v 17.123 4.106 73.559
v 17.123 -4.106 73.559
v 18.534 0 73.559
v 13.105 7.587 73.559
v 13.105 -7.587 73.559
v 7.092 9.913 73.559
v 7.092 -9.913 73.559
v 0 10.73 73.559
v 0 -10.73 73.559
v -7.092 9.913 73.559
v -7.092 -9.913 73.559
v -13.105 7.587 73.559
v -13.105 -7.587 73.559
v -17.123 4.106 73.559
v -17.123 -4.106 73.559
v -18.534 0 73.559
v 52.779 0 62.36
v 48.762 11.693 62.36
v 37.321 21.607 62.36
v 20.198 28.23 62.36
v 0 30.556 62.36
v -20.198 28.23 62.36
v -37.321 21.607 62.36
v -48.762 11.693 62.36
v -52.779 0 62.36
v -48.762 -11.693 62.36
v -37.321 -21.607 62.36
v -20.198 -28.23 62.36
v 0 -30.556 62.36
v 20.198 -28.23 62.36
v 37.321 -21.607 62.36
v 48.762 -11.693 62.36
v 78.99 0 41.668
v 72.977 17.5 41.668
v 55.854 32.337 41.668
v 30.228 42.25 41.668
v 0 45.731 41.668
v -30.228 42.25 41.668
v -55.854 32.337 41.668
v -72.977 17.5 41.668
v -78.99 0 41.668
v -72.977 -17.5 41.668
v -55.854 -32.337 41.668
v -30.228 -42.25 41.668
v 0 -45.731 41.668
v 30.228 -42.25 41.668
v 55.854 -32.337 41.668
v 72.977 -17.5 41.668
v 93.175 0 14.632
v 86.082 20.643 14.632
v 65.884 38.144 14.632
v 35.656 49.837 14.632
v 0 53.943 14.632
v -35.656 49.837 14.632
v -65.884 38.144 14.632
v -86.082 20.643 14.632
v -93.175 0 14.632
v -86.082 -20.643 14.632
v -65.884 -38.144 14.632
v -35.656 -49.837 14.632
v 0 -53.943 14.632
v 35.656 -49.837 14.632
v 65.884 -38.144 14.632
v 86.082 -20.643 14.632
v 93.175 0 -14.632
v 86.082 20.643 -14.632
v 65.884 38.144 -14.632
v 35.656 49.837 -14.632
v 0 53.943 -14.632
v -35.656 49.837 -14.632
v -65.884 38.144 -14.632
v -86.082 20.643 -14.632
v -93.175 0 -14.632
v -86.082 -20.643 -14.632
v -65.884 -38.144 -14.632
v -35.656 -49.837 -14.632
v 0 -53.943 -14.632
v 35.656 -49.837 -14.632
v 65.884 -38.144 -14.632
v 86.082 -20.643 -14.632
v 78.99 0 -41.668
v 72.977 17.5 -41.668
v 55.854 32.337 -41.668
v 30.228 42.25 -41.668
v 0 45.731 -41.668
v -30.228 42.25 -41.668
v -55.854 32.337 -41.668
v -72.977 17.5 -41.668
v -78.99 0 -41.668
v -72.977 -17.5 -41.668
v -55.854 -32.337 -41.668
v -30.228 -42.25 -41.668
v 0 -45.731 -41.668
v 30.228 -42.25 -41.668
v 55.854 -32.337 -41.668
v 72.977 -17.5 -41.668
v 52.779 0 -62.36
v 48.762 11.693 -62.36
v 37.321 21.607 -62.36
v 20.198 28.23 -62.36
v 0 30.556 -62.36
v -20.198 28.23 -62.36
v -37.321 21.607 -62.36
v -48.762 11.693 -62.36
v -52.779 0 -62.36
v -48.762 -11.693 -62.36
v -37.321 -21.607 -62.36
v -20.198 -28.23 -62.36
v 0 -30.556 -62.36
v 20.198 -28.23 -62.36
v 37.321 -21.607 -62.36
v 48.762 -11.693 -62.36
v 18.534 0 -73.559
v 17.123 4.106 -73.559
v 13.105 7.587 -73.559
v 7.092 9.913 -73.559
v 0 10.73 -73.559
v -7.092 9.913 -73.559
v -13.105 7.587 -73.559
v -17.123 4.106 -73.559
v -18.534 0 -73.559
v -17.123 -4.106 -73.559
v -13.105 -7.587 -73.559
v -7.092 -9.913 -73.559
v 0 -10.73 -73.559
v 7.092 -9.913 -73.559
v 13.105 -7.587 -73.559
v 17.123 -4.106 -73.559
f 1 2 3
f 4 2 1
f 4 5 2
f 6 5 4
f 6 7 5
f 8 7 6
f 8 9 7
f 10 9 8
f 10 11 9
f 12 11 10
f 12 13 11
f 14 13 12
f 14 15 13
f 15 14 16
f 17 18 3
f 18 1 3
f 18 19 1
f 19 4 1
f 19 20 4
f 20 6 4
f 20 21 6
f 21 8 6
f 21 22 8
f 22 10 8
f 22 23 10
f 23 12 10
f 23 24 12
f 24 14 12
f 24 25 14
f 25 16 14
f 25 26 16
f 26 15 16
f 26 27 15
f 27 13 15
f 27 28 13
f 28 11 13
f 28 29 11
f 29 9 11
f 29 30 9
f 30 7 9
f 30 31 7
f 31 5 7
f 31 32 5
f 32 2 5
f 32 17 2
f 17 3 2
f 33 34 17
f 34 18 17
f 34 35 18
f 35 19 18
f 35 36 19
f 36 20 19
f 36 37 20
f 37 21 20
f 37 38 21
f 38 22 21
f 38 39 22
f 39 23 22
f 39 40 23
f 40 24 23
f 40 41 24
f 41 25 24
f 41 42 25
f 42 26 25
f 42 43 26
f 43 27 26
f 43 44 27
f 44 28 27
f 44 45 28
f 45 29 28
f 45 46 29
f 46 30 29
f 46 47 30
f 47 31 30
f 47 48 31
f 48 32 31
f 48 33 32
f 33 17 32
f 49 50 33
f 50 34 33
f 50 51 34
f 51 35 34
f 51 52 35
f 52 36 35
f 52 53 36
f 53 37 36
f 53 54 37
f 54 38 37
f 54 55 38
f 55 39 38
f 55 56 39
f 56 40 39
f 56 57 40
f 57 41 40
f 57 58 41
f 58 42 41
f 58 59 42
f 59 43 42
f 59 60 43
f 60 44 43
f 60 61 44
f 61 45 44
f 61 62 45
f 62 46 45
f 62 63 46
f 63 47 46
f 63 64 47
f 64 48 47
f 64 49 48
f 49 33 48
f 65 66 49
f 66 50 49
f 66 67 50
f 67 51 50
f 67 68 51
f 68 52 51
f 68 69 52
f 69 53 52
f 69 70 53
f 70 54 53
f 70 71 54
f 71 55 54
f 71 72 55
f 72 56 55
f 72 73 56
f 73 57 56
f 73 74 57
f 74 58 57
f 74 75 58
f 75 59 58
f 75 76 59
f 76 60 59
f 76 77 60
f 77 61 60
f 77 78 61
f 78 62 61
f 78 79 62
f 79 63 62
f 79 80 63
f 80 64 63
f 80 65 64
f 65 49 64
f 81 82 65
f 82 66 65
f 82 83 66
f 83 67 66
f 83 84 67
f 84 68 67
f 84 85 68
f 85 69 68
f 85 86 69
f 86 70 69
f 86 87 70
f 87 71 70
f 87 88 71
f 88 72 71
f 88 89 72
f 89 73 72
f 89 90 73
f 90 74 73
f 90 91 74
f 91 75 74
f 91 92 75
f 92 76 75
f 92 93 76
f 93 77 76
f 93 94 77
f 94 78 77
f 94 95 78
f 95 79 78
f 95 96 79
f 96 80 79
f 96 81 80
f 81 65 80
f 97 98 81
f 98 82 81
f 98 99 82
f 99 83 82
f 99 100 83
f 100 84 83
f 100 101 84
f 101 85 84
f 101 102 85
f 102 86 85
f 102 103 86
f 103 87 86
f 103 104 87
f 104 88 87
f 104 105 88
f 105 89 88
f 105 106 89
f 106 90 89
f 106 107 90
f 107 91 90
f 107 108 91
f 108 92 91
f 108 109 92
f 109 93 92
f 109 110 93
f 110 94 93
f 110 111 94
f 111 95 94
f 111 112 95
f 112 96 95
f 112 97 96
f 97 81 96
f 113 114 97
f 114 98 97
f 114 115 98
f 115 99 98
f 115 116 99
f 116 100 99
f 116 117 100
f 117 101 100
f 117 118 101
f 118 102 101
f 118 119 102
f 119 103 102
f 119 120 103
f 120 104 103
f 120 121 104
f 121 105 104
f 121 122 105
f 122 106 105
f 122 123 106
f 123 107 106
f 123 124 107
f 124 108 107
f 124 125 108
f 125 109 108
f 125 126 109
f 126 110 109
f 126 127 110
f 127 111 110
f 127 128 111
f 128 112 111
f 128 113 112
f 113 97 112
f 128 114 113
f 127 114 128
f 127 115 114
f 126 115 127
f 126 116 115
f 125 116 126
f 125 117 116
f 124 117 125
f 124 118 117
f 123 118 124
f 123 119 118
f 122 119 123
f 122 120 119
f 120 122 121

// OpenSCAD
// Generated by SolidPython 1.0.1 on 2020-07-29 00:46:54


scale(v = [19, 11, 15]) {
	sphere(r = 5);
}
/***********************************************
*********      SolidPython code:      **********
************************************************
 
# import packages: SolidPython
from solid import *
from solid.utils import *
from itertools import chain, combinations, permutations


class Resize:

    def __init__(self, scad_file):
        self.scad_file = scad_file
        #self.scad_file = import_scad(scad_file)
        # cone/cylinder param:
        self.r1 = 0
        self.r2 = 0
        self.h = 0
        # rectangular prism param:
        self.w = 0
        self.l = 0
        # ellipse param:
        self.r = 0

    # import OpenScad code (file name corresponds to shape)


    # classify shape + parameters
    def assign(self, param1, param2, param3):
        if self.scad_file == 'cone.scad':
            self.r1 = param1
            self.r2 = param2
            self.h = param3
        elif self.scad_file == 'cylinder.scad':
            self.r1 = param1
            self.r2 = param2
            self.h = param3
        elif self.scad_file == 'rectangularPrism.scad':
            self.h = param1
            self.l = param2
            self.w = param3
        else:
            self.r = param1
            self.h = param2

    # resize parameters
    def iterate(self):
        x = range(3, 20, 2)
        i = 1
        if self.scad_file == 'cone.scad':
            tempList = list(permutations(x, 2))
            for temp in tempList:
                param1 = temp[0]
                param2 = temp[1]
                filepath = 'produced_scad_files/' + 'cone' + str(param1) + '_' + str(param2) + '_' + '.scad'
                scad_render_to_file(cylinder(h=param1, r1=param2, r2=0), filepath)

        elif self.scad_file == 'cylinder.scad':
            tempList = list(permutations(x, 3))
            for temp in tempList:
                param1 = temp[0]
                param2 = temp[1]
                filepath = 'produced_scad_files/' + 'cylinder' + str(param1) + '_' + str(param2) + '_' + '.scad'
                scad_render_to_file(cylinder(h=param1, r1=param2, r2=param2), filepath)

        elif self.scad_file == 'rectangularPrism.scad':
            tempList = list(permutations(x, 3))
            for temp in tempList:
                param1 = temp[0]
                param2 = temp[1]
                param3 = temp[2]
                filepath = 'produced_scad_files/' + 'rectangularPrism' + str(param1) + '_' + str(param2) + '_' + str(
                    param3) + '.scad'
                scad_render_to_file(cube(size=(param1, param2, param3)), filepath)

        elif self.scad_file == 'ellipse.scad':
            tempList = list(permutations(x, 4))
            for temp in tempList:
                param1 = temp[0]
                param2 = temp[1]
                param3 = temp[2]
                param4 = temp[3]
                filepath = 'produced_scad_files/' + 'ellipse' + str(param1) + '_' + str(param2) + '_' + str(param3) + '_' + str(param4) + '.scad'
                scad_render_to_file(scale([param1, param2, param3])(sphere(r=param4)), filepath)

    def render_to_scadfile(self):
        scad_render_to_file(scad, 'example.scad') 
 
************************************************/
